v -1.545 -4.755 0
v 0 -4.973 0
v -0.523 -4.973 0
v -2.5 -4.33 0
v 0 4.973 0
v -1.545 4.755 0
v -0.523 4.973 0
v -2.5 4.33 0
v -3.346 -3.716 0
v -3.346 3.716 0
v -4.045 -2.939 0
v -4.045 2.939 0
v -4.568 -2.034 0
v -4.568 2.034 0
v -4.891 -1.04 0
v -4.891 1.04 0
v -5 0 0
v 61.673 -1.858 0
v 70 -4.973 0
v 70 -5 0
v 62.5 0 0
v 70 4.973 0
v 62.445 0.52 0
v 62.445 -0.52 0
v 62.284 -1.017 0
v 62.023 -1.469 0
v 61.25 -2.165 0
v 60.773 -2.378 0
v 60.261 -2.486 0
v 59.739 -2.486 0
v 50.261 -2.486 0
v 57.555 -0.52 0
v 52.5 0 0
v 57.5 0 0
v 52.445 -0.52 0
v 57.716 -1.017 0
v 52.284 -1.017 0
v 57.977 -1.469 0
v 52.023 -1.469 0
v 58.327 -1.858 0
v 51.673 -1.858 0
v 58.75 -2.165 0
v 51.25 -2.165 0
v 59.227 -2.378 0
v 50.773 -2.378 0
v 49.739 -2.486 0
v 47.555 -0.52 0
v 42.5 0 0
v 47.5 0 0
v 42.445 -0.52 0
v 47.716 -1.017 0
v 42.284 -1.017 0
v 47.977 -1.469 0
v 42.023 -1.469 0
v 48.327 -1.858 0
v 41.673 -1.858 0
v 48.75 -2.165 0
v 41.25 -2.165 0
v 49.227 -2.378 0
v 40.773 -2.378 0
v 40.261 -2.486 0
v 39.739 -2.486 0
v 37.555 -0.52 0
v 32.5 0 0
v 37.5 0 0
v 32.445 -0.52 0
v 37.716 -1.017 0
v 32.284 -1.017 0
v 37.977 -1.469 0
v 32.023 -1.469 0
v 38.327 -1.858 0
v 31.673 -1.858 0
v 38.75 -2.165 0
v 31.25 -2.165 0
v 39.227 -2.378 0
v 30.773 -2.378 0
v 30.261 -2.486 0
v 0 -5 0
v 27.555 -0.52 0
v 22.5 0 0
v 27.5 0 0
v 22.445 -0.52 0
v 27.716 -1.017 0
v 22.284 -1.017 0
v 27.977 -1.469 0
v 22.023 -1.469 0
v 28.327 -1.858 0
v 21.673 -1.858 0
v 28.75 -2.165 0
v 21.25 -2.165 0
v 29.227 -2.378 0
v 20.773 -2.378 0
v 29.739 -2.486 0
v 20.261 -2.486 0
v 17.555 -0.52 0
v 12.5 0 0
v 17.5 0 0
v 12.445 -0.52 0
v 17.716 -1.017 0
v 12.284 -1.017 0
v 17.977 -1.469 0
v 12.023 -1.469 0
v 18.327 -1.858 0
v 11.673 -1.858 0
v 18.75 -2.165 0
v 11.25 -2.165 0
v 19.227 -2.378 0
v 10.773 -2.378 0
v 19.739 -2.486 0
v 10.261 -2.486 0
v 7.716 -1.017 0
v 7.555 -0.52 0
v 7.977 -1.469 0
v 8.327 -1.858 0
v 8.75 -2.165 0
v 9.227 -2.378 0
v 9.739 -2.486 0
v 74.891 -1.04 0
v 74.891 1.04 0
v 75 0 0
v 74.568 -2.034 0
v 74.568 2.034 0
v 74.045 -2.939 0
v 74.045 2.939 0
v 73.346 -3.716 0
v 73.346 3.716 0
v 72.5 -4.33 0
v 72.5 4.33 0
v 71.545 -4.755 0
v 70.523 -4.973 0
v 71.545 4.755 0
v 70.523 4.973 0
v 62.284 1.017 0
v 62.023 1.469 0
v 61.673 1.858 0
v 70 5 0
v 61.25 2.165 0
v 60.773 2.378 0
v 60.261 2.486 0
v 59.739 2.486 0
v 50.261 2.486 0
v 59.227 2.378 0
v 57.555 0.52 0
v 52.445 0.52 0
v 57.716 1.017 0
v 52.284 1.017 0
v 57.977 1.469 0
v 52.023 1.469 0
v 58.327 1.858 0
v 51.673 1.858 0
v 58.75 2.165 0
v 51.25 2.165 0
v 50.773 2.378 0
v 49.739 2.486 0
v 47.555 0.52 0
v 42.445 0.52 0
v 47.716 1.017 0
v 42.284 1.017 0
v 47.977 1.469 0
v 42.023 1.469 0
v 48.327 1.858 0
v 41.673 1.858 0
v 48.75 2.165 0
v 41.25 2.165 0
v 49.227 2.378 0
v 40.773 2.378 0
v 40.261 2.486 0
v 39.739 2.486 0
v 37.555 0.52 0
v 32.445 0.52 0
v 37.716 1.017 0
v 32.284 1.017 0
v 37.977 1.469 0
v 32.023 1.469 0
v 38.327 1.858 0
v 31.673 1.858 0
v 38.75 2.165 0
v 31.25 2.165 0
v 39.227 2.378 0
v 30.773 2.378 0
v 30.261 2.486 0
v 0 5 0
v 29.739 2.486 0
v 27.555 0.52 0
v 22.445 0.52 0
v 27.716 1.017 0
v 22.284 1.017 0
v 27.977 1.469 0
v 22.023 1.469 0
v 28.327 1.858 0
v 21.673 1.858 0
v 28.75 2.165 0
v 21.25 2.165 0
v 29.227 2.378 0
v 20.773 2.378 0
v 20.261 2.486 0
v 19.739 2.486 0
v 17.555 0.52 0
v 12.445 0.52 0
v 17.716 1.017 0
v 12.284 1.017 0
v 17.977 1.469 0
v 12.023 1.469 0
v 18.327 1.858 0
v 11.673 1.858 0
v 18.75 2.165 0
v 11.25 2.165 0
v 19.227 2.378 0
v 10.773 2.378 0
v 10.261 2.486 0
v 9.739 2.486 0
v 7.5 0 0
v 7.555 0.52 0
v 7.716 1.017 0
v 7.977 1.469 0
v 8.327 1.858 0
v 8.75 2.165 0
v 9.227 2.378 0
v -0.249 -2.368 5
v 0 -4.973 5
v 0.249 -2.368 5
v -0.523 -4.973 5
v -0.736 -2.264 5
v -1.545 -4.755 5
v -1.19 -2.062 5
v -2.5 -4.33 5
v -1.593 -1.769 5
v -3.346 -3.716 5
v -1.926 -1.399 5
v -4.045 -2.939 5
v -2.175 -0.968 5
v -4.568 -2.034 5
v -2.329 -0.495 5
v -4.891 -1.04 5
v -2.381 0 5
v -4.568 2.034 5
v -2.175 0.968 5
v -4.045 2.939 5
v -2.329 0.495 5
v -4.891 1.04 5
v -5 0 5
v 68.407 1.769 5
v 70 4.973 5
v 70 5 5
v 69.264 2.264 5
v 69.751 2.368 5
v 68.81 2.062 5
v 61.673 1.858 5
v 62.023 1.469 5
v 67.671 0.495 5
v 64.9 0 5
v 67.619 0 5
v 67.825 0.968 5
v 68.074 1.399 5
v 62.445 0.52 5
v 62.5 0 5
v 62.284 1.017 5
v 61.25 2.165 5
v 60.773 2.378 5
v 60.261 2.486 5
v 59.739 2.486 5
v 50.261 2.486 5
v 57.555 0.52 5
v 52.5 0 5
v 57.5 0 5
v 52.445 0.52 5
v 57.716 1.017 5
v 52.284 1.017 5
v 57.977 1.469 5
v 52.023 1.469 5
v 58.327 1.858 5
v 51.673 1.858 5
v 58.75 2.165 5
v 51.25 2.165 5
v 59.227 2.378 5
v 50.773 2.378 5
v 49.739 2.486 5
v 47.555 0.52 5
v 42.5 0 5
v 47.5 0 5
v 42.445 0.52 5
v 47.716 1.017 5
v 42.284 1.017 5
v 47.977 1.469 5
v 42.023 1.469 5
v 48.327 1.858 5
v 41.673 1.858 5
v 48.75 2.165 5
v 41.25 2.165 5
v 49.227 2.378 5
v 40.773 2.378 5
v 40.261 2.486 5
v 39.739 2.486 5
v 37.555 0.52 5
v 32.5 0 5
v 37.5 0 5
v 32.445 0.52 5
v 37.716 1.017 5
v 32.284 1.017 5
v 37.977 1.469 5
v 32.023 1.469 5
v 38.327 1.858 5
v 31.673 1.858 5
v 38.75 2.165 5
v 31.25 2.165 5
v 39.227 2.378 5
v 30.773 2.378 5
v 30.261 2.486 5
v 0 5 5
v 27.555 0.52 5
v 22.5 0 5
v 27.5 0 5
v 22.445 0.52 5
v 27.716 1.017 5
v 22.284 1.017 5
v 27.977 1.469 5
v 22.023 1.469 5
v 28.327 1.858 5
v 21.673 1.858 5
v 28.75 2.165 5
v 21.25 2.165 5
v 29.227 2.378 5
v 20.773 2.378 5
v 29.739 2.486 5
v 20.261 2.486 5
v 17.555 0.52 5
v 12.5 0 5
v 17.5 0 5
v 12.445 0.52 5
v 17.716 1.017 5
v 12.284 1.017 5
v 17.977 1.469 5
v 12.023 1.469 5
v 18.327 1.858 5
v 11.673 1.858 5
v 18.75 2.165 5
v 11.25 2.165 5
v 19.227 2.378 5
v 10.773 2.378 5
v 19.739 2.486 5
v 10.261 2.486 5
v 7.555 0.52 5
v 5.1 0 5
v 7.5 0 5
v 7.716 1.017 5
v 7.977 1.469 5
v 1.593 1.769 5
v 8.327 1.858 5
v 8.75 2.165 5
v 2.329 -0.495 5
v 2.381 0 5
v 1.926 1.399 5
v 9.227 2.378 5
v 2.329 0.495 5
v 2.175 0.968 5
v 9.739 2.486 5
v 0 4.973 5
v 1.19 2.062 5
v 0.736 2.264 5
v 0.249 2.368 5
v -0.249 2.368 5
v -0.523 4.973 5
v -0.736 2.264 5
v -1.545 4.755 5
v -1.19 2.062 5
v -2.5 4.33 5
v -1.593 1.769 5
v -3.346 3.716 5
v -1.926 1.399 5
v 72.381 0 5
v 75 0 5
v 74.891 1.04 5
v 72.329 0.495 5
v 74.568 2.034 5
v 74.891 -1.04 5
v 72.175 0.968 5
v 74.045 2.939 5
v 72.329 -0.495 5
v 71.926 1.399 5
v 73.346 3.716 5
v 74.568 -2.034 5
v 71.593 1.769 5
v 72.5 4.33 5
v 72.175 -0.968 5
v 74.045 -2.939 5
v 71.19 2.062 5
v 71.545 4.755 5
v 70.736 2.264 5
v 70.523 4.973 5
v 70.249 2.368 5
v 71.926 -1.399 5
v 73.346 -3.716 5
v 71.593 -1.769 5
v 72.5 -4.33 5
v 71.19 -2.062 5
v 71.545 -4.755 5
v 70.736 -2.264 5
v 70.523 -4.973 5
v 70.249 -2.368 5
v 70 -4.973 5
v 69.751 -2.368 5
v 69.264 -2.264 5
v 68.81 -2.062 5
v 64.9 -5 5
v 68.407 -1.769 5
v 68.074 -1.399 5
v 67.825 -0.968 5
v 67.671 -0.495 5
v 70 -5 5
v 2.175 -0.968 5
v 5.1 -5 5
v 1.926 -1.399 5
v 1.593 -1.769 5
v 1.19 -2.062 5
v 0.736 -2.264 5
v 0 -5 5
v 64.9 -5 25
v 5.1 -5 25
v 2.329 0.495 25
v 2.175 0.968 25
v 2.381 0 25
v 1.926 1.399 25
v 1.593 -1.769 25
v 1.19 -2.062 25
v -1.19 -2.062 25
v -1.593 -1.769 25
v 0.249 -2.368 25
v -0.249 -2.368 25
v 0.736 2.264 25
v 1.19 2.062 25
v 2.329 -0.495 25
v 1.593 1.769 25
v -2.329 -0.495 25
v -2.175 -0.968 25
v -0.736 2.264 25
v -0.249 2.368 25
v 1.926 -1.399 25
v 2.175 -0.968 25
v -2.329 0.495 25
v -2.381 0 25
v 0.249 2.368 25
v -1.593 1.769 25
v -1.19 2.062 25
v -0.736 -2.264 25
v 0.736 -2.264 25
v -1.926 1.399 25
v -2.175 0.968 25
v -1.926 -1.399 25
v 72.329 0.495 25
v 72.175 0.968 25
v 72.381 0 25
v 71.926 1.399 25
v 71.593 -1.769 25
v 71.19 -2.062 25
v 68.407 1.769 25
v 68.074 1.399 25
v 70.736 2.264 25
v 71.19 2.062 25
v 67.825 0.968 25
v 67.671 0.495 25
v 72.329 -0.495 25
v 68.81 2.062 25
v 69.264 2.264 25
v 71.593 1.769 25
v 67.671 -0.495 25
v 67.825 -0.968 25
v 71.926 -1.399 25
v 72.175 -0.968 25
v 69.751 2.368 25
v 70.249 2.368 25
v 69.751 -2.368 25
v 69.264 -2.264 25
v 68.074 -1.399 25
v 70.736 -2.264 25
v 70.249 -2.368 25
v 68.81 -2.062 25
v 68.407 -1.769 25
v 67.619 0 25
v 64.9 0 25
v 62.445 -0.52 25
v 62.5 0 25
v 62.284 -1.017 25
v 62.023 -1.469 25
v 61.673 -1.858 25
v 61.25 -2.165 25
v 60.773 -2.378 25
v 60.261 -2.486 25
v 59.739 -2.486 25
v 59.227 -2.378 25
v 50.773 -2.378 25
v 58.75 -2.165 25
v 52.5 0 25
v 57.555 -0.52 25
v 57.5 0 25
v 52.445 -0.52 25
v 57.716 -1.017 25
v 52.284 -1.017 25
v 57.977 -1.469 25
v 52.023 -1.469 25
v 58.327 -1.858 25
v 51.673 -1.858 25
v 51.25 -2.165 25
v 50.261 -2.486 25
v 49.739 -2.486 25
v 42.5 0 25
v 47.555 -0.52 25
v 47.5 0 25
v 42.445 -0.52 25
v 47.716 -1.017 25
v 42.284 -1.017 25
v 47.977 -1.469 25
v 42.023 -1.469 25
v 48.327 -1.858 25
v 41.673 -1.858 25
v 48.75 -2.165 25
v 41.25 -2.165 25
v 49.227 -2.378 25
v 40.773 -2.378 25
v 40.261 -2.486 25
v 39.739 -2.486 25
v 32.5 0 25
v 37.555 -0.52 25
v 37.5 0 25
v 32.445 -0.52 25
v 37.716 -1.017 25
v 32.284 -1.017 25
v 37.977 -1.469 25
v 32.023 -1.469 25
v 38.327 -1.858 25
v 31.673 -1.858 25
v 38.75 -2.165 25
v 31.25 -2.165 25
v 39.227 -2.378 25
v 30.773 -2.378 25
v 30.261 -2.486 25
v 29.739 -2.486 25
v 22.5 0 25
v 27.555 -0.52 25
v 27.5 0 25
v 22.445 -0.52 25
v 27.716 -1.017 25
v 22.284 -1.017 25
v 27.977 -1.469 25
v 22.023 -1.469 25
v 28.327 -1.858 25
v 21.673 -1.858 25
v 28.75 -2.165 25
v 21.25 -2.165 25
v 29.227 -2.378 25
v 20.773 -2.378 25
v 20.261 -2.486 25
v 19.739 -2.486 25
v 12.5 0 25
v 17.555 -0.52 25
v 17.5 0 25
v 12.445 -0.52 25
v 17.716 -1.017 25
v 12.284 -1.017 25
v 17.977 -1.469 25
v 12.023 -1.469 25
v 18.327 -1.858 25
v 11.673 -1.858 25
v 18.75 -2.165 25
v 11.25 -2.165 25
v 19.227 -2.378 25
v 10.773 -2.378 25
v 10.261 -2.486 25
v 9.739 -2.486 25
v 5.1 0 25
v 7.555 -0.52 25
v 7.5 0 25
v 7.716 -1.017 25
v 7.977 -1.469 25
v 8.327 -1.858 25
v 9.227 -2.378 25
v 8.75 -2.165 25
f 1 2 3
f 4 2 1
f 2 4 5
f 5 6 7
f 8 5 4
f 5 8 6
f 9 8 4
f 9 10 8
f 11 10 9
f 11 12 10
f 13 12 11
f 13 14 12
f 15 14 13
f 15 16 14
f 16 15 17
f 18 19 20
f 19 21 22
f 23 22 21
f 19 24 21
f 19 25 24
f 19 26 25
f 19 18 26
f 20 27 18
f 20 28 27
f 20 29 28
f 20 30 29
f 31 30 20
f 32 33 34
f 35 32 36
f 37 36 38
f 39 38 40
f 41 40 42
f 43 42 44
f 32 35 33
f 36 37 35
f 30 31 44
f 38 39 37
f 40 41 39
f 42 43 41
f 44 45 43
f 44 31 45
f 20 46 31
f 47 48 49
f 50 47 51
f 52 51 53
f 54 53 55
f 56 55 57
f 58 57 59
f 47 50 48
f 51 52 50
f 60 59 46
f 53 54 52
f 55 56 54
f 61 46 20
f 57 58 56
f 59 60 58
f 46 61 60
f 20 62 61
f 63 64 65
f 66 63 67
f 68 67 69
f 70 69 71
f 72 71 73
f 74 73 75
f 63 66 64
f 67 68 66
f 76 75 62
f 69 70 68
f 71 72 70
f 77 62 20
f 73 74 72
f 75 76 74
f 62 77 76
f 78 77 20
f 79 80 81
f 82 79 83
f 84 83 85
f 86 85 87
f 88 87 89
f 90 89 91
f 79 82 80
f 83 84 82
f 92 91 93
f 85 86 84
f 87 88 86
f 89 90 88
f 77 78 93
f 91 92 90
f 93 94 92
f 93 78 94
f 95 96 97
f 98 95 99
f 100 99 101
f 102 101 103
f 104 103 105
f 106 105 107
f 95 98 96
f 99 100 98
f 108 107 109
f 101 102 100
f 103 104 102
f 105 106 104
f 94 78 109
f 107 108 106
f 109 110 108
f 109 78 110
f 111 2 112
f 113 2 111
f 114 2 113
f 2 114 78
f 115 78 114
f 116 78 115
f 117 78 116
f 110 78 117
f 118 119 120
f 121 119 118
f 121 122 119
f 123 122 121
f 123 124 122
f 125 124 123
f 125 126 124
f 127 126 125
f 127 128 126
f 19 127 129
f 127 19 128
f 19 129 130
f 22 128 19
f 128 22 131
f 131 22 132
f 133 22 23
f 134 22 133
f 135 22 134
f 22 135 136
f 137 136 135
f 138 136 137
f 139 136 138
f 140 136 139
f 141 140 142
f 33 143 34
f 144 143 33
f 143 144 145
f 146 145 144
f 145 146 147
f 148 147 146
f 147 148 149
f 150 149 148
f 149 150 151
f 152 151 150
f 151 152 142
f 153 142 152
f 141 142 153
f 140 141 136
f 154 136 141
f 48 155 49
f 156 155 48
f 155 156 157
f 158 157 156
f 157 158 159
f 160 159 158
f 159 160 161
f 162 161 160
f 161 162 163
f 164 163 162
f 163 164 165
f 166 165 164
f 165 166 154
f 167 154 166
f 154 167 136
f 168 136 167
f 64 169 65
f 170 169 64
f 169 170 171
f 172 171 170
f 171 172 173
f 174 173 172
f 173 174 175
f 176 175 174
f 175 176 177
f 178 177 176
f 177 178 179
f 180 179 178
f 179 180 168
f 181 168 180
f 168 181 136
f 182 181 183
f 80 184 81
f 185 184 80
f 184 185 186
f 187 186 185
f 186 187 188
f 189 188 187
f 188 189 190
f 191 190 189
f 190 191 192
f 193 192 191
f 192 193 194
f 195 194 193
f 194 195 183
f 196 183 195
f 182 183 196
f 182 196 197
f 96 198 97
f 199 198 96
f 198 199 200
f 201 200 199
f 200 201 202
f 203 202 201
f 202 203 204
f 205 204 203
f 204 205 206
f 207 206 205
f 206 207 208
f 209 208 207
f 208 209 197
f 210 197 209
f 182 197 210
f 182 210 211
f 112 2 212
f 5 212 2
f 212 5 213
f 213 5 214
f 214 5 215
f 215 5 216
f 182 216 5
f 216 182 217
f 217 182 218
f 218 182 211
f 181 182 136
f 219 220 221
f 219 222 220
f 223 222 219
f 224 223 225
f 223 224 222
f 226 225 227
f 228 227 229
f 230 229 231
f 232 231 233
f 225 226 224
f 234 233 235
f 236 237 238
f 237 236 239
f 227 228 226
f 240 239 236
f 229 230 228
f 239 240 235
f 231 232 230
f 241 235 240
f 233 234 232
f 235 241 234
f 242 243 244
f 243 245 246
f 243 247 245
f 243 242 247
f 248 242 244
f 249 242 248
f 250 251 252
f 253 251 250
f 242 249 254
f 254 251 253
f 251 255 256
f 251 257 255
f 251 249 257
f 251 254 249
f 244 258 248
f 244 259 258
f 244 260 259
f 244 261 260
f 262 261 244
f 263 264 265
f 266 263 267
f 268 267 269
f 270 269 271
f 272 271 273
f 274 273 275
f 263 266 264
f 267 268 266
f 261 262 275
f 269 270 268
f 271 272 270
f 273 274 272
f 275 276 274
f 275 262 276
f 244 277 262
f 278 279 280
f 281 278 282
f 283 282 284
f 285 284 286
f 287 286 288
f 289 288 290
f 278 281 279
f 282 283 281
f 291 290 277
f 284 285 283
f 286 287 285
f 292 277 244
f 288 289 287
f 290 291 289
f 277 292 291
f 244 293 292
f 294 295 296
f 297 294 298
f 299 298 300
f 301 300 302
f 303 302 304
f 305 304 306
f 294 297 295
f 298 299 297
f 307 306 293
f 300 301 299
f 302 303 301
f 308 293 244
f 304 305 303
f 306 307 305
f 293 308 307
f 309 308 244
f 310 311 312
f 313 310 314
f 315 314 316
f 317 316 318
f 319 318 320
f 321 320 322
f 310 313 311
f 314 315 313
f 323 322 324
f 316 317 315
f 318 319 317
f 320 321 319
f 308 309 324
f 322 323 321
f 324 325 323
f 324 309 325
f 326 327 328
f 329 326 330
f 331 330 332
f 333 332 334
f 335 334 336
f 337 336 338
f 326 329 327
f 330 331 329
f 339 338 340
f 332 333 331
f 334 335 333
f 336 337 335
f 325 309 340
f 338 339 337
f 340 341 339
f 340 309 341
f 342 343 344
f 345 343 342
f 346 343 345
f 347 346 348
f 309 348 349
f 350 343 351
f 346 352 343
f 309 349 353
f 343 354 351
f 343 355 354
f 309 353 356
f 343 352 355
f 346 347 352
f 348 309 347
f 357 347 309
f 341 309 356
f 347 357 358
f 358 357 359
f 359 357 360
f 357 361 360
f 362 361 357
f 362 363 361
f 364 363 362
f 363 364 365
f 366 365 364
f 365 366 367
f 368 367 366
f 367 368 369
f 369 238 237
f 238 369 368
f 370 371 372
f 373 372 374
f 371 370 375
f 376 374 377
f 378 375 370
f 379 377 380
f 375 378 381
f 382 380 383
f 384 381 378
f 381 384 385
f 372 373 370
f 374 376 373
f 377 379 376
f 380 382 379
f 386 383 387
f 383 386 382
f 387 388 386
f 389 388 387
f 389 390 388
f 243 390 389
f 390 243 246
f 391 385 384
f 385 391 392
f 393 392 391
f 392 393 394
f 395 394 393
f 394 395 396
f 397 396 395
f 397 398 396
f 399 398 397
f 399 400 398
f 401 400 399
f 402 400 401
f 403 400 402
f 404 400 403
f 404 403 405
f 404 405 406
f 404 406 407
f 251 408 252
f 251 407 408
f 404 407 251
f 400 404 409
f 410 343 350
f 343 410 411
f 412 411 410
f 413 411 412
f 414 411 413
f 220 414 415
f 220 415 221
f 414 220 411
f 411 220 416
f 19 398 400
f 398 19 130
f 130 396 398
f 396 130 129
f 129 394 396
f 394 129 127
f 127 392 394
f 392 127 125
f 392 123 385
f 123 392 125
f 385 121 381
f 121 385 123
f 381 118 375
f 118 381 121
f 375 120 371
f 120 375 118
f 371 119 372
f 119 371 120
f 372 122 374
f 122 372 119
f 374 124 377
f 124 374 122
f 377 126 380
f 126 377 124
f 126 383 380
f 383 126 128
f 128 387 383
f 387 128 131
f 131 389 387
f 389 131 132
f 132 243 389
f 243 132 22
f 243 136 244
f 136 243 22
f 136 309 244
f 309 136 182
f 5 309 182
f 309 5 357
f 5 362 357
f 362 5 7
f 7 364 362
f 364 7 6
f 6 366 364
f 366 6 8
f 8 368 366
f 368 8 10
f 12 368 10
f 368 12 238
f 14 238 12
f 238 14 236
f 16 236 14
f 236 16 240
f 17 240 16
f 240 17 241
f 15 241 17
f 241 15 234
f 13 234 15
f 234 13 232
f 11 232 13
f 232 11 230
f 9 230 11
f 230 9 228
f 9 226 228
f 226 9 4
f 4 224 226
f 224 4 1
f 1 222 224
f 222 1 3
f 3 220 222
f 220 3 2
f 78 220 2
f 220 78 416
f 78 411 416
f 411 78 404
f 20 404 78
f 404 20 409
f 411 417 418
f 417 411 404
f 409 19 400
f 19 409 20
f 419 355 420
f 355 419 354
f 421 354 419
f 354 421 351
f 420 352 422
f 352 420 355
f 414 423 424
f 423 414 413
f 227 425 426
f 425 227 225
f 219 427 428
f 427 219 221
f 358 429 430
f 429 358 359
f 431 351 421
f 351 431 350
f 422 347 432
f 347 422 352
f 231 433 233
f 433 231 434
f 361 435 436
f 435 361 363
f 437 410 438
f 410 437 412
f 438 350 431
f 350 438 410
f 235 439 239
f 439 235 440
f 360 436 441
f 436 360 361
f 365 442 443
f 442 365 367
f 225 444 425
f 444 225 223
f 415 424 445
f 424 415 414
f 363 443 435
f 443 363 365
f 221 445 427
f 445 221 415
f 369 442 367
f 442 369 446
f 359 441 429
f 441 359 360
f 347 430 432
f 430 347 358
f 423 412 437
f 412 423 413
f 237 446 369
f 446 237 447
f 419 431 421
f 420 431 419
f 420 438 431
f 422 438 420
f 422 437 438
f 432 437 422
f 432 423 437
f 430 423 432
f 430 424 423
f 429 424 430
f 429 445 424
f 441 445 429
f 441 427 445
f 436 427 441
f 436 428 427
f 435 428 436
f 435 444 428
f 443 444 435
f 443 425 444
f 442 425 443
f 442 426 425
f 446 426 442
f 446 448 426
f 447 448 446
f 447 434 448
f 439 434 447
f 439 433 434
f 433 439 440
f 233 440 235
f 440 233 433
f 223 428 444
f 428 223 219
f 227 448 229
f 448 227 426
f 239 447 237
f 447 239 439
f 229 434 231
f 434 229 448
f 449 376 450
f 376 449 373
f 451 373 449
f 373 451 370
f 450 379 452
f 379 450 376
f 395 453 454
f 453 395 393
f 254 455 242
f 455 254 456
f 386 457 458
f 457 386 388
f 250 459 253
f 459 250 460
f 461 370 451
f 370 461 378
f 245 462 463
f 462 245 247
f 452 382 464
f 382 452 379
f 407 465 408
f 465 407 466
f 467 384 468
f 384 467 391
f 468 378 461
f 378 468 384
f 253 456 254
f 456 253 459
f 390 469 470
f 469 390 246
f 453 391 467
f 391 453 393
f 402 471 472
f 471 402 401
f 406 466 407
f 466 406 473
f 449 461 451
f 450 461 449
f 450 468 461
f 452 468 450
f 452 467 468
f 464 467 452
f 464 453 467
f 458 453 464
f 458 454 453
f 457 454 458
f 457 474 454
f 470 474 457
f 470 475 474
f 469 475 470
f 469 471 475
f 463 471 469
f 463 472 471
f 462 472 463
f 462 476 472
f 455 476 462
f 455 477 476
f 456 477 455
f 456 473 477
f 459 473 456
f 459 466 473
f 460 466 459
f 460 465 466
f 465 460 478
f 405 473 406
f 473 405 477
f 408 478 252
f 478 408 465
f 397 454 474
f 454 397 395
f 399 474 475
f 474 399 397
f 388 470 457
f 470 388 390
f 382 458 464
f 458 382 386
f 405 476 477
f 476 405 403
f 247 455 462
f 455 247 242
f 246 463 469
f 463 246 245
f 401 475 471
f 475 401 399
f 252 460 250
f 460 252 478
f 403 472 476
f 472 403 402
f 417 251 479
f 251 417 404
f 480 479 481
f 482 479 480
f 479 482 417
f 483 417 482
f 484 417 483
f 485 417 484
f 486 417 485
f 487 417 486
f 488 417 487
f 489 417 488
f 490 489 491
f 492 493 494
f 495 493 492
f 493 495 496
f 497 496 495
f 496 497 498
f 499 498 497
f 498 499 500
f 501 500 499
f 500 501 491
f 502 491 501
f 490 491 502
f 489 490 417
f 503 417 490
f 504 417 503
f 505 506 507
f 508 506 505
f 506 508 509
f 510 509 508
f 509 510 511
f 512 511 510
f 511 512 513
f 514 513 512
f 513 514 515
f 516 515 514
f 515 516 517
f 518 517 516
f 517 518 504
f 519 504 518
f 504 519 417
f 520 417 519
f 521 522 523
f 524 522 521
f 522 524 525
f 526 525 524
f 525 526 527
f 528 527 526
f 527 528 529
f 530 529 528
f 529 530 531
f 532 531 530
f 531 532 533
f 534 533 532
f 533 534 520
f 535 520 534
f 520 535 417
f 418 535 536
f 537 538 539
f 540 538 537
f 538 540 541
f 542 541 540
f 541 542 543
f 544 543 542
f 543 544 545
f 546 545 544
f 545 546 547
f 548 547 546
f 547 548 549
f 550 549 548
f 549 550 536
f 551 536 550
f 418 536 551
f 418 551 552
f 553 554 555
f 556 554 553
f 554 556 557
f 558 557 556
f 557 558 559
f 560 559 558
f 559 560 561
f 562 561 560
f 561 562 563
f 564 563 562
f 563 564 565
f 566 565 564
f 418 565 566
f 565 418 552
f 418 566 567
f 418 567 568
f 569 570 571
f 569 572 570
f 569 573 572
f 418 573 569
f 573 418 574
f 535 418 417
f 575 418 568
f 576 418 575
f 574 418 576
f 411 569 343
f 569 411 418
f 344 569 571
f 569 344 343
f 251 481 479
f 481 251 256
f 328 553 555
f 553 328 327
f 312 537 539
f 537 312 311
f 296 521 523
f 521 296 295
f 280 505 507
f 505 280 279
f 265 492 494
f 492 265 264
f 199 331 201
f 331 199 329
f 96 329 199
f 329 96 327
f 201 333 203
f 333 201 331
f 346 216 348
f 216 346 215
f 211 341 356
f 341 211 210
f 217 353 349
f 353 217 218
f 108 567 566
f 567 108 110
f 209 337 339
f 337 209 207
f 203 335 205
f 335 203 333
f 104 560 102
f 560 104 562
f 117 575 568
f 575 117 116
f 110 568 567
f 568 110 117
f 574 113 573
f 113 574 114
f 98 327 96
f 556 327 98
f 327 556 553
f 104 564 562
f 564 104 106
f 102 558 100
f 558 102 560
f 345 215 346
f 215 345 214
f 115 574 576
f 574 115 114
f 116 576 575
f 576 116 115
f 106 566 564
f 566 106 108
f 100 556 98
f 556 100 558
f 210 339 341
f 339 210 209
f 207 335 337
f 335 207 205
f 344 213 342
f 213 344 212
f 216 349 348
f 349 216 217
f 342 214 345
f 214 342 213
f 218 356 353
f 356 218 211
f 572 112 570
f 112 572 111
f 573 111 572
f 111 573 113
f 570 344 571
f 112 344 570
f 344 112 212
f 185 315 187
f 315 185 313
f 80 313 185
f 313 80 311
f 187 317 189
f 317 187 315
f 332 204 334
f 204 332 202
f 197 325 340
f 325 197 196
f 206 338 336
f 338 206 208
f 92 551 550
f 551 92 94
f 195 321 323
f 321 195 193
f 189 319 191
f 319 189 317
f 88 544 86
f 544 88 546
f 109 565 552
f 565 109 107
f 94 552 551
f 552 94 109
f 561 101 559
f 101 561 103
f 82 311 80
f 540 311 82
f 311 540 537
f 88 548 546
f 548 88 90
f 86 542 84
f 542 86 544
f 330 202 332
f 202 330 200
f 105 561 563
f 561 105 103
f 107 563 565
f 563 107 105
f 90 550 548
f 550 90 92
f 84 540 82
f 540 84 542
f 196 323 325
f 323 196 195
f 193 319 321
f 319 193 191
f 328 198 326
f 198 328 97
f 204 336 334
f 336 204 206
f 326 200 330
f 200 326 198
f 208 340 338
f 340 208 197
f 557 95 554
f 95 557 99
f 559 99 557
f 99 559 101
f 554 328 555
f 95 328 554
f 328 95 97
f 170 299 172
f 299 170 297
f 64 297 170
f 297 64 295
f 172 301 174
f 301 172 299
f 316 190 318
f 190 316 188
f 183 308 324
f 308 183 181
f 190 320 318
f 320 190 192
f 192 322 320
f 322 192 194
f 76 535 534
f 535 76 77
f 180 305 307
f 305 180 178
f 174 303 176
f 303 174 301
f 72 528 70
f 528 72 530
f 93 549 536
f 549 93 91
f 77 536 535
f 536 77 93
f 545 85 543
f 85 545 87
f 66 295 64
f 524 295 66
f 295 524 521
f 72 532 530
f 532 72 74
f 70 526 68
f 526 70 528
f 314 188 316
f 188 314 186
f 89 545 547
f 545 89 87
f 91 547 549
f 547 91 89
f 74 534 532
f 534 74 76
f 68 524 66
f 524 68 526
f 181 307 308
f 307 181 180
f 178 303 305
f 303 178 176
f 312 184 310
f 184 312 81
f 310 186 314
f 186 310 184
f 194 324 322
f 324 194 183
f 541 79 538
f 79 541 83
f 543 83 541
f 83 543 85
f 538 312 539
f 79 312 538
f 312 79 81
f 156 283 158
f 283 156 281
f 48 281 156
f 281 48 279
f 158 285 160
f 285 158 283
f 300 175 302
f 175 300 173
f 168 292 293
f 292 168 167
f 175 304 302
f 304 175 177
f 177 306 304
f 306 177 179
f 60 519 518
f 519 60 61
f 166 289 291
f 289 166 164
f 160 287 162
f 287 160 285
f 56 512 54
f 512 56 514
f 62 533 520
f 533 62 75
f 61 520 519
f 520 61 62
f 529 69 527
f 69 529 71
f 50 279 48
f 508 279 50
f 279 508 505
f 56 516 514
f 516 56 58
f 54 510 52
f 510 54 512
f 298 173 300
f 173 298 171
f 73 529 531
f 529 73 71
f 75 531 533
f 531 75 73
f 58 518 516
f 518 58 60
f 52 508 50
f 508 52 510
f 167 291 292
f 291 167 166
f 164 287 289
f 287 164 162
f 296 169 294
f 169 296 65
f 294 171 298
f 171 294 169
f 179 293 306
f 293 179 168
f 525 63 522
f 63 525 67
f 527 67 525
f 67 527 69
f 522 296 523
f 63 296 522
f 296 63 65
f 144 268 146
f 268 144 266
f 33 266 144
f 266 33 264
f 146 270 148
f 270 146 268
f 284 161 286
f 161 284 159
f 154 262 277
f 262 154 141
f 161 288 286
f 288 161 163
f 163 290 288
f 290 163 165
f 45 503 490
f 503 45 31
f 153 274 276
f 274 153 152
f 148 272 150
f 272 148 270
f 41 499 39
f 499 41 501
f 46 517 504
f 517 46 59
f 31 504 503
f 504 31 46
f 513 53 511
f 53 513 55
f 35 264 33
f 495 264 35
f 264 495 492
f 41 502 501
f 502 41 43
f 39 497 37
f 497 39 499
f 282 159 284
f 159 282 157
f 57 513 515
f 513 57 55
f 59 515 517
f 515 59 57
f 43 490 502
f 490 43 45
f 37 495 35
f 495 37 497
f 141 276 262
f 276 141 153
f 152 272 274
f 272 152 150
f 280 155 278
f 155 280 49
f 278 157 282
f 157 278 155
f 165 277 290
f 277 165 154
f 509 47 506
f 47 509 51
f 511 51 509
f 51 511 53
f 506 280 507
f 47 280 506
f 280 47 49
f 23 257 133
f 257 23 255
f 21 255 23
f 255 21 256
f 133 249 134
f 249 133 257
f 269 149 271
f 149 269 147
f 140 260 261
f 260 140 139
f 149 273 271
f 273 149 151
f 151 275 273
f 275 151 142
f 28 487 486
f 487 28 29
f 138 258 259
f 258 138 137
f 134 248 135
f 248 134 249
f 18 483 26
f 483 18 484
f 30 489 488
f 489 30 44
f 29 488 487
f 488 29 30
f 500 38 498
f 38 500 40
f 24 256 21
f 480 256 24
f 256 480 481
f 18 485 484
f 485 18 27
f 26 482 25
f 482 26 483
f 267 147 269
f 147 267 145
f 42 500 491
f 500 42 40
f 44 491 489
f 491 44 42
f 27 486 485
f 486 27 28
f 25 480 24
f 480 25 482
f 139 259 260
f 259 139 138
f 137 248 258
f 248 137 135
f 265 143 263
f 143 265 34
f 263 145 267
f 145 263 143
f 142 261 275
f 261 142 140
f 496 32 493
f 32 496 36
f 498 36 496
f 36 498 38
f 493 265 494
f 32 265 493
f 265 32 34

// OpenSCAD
//
//  Copyright (C) 05-05-2013 Jasper den Ouden.
//
//  This is free software: you can redistribute it and/or modify
//  it under the terms of the GNU General Public License as published
//  by the Free Software Foundation, either version 3 of the License, or
//  (at your option) any later version.
//

// 5mm pole system between wall and plank.

$fs=0.4;

pt  = 20.2; //Plank thickness.
wd = 6; //minimum distance to wall.

dz = 40; //Distance the clamp is lower that the plank.

gl = 20; //Wall grab length.

t=5; //Thicknesses.

al = 5;

wrl = 4*al; //Length of wall receiver profile. (holes are added as fits.)

module wall_receiver_profile()
{
    tx = wd+gl;
    bw = 2*t+2.5*al;
    difference()
    {   union()
        {   square([tx-t/2, pt+2*t]); //Main around plank.
            translate([0,t/2]) square([tx, pt+t]);
            translate([tx-t/2,t/2]) circle(t/2);
            translate([tx-t/2,pt+3*t/2]) circle(t/2);
            
            square([2*t, pt+dz]); //Reaches to clamp section.
            translate([0,pt+dz]) square([bw,5*al-bw/2]);
            translate([bw/2,pt+dz+5*al-bw/2]) circle(bw/2);
        }
        translate([wd,t]) square([2*gl,pt]);
    }
}

module wall_receiver()
{
    tx = wd+gl;
    bw = 2*t+2.5*al;
    difference()
    {   linear_extrude(height=wrl) wall_receiver_profile();
        for( y=[al:2*al:wrl-al] )
            translate([bw-al,2*(pt+dz),y]) rotate([90,0]) cylinder(r=al/2,h=1.2*(pt+dz));
    }
}

//Bar receiver with two bars. For instance to go onto the wall receiver.
brl = 16*al;

module bar_receiver()
{
    sf1 = 1.05; sf2=1.02;
    difference()
    {   union()
        {   linear_extrude(height=t)
            {   circle(al);
                translate([brl/2-al,0]) square([brl-2*al,2*al],center=true);
                translate([brl-2*al,0]) circle(al);
            }
            cylinder(r=al/(2*sf1), h=5*al);
            translate([brl-2*al,0]) cylinder(r=al/(2*sf1), h=5*al);
            translate([sf2*al,-al]) cube([brl-(2+2*sf2)*al,al,5*al]);
        }
        for( x=[2*al:2*al:brl-4*al] ) translate([x,0]) cylinder(r=al/2, h=6*al);
    }
}

bar_receiver();
//wall_receiver();
